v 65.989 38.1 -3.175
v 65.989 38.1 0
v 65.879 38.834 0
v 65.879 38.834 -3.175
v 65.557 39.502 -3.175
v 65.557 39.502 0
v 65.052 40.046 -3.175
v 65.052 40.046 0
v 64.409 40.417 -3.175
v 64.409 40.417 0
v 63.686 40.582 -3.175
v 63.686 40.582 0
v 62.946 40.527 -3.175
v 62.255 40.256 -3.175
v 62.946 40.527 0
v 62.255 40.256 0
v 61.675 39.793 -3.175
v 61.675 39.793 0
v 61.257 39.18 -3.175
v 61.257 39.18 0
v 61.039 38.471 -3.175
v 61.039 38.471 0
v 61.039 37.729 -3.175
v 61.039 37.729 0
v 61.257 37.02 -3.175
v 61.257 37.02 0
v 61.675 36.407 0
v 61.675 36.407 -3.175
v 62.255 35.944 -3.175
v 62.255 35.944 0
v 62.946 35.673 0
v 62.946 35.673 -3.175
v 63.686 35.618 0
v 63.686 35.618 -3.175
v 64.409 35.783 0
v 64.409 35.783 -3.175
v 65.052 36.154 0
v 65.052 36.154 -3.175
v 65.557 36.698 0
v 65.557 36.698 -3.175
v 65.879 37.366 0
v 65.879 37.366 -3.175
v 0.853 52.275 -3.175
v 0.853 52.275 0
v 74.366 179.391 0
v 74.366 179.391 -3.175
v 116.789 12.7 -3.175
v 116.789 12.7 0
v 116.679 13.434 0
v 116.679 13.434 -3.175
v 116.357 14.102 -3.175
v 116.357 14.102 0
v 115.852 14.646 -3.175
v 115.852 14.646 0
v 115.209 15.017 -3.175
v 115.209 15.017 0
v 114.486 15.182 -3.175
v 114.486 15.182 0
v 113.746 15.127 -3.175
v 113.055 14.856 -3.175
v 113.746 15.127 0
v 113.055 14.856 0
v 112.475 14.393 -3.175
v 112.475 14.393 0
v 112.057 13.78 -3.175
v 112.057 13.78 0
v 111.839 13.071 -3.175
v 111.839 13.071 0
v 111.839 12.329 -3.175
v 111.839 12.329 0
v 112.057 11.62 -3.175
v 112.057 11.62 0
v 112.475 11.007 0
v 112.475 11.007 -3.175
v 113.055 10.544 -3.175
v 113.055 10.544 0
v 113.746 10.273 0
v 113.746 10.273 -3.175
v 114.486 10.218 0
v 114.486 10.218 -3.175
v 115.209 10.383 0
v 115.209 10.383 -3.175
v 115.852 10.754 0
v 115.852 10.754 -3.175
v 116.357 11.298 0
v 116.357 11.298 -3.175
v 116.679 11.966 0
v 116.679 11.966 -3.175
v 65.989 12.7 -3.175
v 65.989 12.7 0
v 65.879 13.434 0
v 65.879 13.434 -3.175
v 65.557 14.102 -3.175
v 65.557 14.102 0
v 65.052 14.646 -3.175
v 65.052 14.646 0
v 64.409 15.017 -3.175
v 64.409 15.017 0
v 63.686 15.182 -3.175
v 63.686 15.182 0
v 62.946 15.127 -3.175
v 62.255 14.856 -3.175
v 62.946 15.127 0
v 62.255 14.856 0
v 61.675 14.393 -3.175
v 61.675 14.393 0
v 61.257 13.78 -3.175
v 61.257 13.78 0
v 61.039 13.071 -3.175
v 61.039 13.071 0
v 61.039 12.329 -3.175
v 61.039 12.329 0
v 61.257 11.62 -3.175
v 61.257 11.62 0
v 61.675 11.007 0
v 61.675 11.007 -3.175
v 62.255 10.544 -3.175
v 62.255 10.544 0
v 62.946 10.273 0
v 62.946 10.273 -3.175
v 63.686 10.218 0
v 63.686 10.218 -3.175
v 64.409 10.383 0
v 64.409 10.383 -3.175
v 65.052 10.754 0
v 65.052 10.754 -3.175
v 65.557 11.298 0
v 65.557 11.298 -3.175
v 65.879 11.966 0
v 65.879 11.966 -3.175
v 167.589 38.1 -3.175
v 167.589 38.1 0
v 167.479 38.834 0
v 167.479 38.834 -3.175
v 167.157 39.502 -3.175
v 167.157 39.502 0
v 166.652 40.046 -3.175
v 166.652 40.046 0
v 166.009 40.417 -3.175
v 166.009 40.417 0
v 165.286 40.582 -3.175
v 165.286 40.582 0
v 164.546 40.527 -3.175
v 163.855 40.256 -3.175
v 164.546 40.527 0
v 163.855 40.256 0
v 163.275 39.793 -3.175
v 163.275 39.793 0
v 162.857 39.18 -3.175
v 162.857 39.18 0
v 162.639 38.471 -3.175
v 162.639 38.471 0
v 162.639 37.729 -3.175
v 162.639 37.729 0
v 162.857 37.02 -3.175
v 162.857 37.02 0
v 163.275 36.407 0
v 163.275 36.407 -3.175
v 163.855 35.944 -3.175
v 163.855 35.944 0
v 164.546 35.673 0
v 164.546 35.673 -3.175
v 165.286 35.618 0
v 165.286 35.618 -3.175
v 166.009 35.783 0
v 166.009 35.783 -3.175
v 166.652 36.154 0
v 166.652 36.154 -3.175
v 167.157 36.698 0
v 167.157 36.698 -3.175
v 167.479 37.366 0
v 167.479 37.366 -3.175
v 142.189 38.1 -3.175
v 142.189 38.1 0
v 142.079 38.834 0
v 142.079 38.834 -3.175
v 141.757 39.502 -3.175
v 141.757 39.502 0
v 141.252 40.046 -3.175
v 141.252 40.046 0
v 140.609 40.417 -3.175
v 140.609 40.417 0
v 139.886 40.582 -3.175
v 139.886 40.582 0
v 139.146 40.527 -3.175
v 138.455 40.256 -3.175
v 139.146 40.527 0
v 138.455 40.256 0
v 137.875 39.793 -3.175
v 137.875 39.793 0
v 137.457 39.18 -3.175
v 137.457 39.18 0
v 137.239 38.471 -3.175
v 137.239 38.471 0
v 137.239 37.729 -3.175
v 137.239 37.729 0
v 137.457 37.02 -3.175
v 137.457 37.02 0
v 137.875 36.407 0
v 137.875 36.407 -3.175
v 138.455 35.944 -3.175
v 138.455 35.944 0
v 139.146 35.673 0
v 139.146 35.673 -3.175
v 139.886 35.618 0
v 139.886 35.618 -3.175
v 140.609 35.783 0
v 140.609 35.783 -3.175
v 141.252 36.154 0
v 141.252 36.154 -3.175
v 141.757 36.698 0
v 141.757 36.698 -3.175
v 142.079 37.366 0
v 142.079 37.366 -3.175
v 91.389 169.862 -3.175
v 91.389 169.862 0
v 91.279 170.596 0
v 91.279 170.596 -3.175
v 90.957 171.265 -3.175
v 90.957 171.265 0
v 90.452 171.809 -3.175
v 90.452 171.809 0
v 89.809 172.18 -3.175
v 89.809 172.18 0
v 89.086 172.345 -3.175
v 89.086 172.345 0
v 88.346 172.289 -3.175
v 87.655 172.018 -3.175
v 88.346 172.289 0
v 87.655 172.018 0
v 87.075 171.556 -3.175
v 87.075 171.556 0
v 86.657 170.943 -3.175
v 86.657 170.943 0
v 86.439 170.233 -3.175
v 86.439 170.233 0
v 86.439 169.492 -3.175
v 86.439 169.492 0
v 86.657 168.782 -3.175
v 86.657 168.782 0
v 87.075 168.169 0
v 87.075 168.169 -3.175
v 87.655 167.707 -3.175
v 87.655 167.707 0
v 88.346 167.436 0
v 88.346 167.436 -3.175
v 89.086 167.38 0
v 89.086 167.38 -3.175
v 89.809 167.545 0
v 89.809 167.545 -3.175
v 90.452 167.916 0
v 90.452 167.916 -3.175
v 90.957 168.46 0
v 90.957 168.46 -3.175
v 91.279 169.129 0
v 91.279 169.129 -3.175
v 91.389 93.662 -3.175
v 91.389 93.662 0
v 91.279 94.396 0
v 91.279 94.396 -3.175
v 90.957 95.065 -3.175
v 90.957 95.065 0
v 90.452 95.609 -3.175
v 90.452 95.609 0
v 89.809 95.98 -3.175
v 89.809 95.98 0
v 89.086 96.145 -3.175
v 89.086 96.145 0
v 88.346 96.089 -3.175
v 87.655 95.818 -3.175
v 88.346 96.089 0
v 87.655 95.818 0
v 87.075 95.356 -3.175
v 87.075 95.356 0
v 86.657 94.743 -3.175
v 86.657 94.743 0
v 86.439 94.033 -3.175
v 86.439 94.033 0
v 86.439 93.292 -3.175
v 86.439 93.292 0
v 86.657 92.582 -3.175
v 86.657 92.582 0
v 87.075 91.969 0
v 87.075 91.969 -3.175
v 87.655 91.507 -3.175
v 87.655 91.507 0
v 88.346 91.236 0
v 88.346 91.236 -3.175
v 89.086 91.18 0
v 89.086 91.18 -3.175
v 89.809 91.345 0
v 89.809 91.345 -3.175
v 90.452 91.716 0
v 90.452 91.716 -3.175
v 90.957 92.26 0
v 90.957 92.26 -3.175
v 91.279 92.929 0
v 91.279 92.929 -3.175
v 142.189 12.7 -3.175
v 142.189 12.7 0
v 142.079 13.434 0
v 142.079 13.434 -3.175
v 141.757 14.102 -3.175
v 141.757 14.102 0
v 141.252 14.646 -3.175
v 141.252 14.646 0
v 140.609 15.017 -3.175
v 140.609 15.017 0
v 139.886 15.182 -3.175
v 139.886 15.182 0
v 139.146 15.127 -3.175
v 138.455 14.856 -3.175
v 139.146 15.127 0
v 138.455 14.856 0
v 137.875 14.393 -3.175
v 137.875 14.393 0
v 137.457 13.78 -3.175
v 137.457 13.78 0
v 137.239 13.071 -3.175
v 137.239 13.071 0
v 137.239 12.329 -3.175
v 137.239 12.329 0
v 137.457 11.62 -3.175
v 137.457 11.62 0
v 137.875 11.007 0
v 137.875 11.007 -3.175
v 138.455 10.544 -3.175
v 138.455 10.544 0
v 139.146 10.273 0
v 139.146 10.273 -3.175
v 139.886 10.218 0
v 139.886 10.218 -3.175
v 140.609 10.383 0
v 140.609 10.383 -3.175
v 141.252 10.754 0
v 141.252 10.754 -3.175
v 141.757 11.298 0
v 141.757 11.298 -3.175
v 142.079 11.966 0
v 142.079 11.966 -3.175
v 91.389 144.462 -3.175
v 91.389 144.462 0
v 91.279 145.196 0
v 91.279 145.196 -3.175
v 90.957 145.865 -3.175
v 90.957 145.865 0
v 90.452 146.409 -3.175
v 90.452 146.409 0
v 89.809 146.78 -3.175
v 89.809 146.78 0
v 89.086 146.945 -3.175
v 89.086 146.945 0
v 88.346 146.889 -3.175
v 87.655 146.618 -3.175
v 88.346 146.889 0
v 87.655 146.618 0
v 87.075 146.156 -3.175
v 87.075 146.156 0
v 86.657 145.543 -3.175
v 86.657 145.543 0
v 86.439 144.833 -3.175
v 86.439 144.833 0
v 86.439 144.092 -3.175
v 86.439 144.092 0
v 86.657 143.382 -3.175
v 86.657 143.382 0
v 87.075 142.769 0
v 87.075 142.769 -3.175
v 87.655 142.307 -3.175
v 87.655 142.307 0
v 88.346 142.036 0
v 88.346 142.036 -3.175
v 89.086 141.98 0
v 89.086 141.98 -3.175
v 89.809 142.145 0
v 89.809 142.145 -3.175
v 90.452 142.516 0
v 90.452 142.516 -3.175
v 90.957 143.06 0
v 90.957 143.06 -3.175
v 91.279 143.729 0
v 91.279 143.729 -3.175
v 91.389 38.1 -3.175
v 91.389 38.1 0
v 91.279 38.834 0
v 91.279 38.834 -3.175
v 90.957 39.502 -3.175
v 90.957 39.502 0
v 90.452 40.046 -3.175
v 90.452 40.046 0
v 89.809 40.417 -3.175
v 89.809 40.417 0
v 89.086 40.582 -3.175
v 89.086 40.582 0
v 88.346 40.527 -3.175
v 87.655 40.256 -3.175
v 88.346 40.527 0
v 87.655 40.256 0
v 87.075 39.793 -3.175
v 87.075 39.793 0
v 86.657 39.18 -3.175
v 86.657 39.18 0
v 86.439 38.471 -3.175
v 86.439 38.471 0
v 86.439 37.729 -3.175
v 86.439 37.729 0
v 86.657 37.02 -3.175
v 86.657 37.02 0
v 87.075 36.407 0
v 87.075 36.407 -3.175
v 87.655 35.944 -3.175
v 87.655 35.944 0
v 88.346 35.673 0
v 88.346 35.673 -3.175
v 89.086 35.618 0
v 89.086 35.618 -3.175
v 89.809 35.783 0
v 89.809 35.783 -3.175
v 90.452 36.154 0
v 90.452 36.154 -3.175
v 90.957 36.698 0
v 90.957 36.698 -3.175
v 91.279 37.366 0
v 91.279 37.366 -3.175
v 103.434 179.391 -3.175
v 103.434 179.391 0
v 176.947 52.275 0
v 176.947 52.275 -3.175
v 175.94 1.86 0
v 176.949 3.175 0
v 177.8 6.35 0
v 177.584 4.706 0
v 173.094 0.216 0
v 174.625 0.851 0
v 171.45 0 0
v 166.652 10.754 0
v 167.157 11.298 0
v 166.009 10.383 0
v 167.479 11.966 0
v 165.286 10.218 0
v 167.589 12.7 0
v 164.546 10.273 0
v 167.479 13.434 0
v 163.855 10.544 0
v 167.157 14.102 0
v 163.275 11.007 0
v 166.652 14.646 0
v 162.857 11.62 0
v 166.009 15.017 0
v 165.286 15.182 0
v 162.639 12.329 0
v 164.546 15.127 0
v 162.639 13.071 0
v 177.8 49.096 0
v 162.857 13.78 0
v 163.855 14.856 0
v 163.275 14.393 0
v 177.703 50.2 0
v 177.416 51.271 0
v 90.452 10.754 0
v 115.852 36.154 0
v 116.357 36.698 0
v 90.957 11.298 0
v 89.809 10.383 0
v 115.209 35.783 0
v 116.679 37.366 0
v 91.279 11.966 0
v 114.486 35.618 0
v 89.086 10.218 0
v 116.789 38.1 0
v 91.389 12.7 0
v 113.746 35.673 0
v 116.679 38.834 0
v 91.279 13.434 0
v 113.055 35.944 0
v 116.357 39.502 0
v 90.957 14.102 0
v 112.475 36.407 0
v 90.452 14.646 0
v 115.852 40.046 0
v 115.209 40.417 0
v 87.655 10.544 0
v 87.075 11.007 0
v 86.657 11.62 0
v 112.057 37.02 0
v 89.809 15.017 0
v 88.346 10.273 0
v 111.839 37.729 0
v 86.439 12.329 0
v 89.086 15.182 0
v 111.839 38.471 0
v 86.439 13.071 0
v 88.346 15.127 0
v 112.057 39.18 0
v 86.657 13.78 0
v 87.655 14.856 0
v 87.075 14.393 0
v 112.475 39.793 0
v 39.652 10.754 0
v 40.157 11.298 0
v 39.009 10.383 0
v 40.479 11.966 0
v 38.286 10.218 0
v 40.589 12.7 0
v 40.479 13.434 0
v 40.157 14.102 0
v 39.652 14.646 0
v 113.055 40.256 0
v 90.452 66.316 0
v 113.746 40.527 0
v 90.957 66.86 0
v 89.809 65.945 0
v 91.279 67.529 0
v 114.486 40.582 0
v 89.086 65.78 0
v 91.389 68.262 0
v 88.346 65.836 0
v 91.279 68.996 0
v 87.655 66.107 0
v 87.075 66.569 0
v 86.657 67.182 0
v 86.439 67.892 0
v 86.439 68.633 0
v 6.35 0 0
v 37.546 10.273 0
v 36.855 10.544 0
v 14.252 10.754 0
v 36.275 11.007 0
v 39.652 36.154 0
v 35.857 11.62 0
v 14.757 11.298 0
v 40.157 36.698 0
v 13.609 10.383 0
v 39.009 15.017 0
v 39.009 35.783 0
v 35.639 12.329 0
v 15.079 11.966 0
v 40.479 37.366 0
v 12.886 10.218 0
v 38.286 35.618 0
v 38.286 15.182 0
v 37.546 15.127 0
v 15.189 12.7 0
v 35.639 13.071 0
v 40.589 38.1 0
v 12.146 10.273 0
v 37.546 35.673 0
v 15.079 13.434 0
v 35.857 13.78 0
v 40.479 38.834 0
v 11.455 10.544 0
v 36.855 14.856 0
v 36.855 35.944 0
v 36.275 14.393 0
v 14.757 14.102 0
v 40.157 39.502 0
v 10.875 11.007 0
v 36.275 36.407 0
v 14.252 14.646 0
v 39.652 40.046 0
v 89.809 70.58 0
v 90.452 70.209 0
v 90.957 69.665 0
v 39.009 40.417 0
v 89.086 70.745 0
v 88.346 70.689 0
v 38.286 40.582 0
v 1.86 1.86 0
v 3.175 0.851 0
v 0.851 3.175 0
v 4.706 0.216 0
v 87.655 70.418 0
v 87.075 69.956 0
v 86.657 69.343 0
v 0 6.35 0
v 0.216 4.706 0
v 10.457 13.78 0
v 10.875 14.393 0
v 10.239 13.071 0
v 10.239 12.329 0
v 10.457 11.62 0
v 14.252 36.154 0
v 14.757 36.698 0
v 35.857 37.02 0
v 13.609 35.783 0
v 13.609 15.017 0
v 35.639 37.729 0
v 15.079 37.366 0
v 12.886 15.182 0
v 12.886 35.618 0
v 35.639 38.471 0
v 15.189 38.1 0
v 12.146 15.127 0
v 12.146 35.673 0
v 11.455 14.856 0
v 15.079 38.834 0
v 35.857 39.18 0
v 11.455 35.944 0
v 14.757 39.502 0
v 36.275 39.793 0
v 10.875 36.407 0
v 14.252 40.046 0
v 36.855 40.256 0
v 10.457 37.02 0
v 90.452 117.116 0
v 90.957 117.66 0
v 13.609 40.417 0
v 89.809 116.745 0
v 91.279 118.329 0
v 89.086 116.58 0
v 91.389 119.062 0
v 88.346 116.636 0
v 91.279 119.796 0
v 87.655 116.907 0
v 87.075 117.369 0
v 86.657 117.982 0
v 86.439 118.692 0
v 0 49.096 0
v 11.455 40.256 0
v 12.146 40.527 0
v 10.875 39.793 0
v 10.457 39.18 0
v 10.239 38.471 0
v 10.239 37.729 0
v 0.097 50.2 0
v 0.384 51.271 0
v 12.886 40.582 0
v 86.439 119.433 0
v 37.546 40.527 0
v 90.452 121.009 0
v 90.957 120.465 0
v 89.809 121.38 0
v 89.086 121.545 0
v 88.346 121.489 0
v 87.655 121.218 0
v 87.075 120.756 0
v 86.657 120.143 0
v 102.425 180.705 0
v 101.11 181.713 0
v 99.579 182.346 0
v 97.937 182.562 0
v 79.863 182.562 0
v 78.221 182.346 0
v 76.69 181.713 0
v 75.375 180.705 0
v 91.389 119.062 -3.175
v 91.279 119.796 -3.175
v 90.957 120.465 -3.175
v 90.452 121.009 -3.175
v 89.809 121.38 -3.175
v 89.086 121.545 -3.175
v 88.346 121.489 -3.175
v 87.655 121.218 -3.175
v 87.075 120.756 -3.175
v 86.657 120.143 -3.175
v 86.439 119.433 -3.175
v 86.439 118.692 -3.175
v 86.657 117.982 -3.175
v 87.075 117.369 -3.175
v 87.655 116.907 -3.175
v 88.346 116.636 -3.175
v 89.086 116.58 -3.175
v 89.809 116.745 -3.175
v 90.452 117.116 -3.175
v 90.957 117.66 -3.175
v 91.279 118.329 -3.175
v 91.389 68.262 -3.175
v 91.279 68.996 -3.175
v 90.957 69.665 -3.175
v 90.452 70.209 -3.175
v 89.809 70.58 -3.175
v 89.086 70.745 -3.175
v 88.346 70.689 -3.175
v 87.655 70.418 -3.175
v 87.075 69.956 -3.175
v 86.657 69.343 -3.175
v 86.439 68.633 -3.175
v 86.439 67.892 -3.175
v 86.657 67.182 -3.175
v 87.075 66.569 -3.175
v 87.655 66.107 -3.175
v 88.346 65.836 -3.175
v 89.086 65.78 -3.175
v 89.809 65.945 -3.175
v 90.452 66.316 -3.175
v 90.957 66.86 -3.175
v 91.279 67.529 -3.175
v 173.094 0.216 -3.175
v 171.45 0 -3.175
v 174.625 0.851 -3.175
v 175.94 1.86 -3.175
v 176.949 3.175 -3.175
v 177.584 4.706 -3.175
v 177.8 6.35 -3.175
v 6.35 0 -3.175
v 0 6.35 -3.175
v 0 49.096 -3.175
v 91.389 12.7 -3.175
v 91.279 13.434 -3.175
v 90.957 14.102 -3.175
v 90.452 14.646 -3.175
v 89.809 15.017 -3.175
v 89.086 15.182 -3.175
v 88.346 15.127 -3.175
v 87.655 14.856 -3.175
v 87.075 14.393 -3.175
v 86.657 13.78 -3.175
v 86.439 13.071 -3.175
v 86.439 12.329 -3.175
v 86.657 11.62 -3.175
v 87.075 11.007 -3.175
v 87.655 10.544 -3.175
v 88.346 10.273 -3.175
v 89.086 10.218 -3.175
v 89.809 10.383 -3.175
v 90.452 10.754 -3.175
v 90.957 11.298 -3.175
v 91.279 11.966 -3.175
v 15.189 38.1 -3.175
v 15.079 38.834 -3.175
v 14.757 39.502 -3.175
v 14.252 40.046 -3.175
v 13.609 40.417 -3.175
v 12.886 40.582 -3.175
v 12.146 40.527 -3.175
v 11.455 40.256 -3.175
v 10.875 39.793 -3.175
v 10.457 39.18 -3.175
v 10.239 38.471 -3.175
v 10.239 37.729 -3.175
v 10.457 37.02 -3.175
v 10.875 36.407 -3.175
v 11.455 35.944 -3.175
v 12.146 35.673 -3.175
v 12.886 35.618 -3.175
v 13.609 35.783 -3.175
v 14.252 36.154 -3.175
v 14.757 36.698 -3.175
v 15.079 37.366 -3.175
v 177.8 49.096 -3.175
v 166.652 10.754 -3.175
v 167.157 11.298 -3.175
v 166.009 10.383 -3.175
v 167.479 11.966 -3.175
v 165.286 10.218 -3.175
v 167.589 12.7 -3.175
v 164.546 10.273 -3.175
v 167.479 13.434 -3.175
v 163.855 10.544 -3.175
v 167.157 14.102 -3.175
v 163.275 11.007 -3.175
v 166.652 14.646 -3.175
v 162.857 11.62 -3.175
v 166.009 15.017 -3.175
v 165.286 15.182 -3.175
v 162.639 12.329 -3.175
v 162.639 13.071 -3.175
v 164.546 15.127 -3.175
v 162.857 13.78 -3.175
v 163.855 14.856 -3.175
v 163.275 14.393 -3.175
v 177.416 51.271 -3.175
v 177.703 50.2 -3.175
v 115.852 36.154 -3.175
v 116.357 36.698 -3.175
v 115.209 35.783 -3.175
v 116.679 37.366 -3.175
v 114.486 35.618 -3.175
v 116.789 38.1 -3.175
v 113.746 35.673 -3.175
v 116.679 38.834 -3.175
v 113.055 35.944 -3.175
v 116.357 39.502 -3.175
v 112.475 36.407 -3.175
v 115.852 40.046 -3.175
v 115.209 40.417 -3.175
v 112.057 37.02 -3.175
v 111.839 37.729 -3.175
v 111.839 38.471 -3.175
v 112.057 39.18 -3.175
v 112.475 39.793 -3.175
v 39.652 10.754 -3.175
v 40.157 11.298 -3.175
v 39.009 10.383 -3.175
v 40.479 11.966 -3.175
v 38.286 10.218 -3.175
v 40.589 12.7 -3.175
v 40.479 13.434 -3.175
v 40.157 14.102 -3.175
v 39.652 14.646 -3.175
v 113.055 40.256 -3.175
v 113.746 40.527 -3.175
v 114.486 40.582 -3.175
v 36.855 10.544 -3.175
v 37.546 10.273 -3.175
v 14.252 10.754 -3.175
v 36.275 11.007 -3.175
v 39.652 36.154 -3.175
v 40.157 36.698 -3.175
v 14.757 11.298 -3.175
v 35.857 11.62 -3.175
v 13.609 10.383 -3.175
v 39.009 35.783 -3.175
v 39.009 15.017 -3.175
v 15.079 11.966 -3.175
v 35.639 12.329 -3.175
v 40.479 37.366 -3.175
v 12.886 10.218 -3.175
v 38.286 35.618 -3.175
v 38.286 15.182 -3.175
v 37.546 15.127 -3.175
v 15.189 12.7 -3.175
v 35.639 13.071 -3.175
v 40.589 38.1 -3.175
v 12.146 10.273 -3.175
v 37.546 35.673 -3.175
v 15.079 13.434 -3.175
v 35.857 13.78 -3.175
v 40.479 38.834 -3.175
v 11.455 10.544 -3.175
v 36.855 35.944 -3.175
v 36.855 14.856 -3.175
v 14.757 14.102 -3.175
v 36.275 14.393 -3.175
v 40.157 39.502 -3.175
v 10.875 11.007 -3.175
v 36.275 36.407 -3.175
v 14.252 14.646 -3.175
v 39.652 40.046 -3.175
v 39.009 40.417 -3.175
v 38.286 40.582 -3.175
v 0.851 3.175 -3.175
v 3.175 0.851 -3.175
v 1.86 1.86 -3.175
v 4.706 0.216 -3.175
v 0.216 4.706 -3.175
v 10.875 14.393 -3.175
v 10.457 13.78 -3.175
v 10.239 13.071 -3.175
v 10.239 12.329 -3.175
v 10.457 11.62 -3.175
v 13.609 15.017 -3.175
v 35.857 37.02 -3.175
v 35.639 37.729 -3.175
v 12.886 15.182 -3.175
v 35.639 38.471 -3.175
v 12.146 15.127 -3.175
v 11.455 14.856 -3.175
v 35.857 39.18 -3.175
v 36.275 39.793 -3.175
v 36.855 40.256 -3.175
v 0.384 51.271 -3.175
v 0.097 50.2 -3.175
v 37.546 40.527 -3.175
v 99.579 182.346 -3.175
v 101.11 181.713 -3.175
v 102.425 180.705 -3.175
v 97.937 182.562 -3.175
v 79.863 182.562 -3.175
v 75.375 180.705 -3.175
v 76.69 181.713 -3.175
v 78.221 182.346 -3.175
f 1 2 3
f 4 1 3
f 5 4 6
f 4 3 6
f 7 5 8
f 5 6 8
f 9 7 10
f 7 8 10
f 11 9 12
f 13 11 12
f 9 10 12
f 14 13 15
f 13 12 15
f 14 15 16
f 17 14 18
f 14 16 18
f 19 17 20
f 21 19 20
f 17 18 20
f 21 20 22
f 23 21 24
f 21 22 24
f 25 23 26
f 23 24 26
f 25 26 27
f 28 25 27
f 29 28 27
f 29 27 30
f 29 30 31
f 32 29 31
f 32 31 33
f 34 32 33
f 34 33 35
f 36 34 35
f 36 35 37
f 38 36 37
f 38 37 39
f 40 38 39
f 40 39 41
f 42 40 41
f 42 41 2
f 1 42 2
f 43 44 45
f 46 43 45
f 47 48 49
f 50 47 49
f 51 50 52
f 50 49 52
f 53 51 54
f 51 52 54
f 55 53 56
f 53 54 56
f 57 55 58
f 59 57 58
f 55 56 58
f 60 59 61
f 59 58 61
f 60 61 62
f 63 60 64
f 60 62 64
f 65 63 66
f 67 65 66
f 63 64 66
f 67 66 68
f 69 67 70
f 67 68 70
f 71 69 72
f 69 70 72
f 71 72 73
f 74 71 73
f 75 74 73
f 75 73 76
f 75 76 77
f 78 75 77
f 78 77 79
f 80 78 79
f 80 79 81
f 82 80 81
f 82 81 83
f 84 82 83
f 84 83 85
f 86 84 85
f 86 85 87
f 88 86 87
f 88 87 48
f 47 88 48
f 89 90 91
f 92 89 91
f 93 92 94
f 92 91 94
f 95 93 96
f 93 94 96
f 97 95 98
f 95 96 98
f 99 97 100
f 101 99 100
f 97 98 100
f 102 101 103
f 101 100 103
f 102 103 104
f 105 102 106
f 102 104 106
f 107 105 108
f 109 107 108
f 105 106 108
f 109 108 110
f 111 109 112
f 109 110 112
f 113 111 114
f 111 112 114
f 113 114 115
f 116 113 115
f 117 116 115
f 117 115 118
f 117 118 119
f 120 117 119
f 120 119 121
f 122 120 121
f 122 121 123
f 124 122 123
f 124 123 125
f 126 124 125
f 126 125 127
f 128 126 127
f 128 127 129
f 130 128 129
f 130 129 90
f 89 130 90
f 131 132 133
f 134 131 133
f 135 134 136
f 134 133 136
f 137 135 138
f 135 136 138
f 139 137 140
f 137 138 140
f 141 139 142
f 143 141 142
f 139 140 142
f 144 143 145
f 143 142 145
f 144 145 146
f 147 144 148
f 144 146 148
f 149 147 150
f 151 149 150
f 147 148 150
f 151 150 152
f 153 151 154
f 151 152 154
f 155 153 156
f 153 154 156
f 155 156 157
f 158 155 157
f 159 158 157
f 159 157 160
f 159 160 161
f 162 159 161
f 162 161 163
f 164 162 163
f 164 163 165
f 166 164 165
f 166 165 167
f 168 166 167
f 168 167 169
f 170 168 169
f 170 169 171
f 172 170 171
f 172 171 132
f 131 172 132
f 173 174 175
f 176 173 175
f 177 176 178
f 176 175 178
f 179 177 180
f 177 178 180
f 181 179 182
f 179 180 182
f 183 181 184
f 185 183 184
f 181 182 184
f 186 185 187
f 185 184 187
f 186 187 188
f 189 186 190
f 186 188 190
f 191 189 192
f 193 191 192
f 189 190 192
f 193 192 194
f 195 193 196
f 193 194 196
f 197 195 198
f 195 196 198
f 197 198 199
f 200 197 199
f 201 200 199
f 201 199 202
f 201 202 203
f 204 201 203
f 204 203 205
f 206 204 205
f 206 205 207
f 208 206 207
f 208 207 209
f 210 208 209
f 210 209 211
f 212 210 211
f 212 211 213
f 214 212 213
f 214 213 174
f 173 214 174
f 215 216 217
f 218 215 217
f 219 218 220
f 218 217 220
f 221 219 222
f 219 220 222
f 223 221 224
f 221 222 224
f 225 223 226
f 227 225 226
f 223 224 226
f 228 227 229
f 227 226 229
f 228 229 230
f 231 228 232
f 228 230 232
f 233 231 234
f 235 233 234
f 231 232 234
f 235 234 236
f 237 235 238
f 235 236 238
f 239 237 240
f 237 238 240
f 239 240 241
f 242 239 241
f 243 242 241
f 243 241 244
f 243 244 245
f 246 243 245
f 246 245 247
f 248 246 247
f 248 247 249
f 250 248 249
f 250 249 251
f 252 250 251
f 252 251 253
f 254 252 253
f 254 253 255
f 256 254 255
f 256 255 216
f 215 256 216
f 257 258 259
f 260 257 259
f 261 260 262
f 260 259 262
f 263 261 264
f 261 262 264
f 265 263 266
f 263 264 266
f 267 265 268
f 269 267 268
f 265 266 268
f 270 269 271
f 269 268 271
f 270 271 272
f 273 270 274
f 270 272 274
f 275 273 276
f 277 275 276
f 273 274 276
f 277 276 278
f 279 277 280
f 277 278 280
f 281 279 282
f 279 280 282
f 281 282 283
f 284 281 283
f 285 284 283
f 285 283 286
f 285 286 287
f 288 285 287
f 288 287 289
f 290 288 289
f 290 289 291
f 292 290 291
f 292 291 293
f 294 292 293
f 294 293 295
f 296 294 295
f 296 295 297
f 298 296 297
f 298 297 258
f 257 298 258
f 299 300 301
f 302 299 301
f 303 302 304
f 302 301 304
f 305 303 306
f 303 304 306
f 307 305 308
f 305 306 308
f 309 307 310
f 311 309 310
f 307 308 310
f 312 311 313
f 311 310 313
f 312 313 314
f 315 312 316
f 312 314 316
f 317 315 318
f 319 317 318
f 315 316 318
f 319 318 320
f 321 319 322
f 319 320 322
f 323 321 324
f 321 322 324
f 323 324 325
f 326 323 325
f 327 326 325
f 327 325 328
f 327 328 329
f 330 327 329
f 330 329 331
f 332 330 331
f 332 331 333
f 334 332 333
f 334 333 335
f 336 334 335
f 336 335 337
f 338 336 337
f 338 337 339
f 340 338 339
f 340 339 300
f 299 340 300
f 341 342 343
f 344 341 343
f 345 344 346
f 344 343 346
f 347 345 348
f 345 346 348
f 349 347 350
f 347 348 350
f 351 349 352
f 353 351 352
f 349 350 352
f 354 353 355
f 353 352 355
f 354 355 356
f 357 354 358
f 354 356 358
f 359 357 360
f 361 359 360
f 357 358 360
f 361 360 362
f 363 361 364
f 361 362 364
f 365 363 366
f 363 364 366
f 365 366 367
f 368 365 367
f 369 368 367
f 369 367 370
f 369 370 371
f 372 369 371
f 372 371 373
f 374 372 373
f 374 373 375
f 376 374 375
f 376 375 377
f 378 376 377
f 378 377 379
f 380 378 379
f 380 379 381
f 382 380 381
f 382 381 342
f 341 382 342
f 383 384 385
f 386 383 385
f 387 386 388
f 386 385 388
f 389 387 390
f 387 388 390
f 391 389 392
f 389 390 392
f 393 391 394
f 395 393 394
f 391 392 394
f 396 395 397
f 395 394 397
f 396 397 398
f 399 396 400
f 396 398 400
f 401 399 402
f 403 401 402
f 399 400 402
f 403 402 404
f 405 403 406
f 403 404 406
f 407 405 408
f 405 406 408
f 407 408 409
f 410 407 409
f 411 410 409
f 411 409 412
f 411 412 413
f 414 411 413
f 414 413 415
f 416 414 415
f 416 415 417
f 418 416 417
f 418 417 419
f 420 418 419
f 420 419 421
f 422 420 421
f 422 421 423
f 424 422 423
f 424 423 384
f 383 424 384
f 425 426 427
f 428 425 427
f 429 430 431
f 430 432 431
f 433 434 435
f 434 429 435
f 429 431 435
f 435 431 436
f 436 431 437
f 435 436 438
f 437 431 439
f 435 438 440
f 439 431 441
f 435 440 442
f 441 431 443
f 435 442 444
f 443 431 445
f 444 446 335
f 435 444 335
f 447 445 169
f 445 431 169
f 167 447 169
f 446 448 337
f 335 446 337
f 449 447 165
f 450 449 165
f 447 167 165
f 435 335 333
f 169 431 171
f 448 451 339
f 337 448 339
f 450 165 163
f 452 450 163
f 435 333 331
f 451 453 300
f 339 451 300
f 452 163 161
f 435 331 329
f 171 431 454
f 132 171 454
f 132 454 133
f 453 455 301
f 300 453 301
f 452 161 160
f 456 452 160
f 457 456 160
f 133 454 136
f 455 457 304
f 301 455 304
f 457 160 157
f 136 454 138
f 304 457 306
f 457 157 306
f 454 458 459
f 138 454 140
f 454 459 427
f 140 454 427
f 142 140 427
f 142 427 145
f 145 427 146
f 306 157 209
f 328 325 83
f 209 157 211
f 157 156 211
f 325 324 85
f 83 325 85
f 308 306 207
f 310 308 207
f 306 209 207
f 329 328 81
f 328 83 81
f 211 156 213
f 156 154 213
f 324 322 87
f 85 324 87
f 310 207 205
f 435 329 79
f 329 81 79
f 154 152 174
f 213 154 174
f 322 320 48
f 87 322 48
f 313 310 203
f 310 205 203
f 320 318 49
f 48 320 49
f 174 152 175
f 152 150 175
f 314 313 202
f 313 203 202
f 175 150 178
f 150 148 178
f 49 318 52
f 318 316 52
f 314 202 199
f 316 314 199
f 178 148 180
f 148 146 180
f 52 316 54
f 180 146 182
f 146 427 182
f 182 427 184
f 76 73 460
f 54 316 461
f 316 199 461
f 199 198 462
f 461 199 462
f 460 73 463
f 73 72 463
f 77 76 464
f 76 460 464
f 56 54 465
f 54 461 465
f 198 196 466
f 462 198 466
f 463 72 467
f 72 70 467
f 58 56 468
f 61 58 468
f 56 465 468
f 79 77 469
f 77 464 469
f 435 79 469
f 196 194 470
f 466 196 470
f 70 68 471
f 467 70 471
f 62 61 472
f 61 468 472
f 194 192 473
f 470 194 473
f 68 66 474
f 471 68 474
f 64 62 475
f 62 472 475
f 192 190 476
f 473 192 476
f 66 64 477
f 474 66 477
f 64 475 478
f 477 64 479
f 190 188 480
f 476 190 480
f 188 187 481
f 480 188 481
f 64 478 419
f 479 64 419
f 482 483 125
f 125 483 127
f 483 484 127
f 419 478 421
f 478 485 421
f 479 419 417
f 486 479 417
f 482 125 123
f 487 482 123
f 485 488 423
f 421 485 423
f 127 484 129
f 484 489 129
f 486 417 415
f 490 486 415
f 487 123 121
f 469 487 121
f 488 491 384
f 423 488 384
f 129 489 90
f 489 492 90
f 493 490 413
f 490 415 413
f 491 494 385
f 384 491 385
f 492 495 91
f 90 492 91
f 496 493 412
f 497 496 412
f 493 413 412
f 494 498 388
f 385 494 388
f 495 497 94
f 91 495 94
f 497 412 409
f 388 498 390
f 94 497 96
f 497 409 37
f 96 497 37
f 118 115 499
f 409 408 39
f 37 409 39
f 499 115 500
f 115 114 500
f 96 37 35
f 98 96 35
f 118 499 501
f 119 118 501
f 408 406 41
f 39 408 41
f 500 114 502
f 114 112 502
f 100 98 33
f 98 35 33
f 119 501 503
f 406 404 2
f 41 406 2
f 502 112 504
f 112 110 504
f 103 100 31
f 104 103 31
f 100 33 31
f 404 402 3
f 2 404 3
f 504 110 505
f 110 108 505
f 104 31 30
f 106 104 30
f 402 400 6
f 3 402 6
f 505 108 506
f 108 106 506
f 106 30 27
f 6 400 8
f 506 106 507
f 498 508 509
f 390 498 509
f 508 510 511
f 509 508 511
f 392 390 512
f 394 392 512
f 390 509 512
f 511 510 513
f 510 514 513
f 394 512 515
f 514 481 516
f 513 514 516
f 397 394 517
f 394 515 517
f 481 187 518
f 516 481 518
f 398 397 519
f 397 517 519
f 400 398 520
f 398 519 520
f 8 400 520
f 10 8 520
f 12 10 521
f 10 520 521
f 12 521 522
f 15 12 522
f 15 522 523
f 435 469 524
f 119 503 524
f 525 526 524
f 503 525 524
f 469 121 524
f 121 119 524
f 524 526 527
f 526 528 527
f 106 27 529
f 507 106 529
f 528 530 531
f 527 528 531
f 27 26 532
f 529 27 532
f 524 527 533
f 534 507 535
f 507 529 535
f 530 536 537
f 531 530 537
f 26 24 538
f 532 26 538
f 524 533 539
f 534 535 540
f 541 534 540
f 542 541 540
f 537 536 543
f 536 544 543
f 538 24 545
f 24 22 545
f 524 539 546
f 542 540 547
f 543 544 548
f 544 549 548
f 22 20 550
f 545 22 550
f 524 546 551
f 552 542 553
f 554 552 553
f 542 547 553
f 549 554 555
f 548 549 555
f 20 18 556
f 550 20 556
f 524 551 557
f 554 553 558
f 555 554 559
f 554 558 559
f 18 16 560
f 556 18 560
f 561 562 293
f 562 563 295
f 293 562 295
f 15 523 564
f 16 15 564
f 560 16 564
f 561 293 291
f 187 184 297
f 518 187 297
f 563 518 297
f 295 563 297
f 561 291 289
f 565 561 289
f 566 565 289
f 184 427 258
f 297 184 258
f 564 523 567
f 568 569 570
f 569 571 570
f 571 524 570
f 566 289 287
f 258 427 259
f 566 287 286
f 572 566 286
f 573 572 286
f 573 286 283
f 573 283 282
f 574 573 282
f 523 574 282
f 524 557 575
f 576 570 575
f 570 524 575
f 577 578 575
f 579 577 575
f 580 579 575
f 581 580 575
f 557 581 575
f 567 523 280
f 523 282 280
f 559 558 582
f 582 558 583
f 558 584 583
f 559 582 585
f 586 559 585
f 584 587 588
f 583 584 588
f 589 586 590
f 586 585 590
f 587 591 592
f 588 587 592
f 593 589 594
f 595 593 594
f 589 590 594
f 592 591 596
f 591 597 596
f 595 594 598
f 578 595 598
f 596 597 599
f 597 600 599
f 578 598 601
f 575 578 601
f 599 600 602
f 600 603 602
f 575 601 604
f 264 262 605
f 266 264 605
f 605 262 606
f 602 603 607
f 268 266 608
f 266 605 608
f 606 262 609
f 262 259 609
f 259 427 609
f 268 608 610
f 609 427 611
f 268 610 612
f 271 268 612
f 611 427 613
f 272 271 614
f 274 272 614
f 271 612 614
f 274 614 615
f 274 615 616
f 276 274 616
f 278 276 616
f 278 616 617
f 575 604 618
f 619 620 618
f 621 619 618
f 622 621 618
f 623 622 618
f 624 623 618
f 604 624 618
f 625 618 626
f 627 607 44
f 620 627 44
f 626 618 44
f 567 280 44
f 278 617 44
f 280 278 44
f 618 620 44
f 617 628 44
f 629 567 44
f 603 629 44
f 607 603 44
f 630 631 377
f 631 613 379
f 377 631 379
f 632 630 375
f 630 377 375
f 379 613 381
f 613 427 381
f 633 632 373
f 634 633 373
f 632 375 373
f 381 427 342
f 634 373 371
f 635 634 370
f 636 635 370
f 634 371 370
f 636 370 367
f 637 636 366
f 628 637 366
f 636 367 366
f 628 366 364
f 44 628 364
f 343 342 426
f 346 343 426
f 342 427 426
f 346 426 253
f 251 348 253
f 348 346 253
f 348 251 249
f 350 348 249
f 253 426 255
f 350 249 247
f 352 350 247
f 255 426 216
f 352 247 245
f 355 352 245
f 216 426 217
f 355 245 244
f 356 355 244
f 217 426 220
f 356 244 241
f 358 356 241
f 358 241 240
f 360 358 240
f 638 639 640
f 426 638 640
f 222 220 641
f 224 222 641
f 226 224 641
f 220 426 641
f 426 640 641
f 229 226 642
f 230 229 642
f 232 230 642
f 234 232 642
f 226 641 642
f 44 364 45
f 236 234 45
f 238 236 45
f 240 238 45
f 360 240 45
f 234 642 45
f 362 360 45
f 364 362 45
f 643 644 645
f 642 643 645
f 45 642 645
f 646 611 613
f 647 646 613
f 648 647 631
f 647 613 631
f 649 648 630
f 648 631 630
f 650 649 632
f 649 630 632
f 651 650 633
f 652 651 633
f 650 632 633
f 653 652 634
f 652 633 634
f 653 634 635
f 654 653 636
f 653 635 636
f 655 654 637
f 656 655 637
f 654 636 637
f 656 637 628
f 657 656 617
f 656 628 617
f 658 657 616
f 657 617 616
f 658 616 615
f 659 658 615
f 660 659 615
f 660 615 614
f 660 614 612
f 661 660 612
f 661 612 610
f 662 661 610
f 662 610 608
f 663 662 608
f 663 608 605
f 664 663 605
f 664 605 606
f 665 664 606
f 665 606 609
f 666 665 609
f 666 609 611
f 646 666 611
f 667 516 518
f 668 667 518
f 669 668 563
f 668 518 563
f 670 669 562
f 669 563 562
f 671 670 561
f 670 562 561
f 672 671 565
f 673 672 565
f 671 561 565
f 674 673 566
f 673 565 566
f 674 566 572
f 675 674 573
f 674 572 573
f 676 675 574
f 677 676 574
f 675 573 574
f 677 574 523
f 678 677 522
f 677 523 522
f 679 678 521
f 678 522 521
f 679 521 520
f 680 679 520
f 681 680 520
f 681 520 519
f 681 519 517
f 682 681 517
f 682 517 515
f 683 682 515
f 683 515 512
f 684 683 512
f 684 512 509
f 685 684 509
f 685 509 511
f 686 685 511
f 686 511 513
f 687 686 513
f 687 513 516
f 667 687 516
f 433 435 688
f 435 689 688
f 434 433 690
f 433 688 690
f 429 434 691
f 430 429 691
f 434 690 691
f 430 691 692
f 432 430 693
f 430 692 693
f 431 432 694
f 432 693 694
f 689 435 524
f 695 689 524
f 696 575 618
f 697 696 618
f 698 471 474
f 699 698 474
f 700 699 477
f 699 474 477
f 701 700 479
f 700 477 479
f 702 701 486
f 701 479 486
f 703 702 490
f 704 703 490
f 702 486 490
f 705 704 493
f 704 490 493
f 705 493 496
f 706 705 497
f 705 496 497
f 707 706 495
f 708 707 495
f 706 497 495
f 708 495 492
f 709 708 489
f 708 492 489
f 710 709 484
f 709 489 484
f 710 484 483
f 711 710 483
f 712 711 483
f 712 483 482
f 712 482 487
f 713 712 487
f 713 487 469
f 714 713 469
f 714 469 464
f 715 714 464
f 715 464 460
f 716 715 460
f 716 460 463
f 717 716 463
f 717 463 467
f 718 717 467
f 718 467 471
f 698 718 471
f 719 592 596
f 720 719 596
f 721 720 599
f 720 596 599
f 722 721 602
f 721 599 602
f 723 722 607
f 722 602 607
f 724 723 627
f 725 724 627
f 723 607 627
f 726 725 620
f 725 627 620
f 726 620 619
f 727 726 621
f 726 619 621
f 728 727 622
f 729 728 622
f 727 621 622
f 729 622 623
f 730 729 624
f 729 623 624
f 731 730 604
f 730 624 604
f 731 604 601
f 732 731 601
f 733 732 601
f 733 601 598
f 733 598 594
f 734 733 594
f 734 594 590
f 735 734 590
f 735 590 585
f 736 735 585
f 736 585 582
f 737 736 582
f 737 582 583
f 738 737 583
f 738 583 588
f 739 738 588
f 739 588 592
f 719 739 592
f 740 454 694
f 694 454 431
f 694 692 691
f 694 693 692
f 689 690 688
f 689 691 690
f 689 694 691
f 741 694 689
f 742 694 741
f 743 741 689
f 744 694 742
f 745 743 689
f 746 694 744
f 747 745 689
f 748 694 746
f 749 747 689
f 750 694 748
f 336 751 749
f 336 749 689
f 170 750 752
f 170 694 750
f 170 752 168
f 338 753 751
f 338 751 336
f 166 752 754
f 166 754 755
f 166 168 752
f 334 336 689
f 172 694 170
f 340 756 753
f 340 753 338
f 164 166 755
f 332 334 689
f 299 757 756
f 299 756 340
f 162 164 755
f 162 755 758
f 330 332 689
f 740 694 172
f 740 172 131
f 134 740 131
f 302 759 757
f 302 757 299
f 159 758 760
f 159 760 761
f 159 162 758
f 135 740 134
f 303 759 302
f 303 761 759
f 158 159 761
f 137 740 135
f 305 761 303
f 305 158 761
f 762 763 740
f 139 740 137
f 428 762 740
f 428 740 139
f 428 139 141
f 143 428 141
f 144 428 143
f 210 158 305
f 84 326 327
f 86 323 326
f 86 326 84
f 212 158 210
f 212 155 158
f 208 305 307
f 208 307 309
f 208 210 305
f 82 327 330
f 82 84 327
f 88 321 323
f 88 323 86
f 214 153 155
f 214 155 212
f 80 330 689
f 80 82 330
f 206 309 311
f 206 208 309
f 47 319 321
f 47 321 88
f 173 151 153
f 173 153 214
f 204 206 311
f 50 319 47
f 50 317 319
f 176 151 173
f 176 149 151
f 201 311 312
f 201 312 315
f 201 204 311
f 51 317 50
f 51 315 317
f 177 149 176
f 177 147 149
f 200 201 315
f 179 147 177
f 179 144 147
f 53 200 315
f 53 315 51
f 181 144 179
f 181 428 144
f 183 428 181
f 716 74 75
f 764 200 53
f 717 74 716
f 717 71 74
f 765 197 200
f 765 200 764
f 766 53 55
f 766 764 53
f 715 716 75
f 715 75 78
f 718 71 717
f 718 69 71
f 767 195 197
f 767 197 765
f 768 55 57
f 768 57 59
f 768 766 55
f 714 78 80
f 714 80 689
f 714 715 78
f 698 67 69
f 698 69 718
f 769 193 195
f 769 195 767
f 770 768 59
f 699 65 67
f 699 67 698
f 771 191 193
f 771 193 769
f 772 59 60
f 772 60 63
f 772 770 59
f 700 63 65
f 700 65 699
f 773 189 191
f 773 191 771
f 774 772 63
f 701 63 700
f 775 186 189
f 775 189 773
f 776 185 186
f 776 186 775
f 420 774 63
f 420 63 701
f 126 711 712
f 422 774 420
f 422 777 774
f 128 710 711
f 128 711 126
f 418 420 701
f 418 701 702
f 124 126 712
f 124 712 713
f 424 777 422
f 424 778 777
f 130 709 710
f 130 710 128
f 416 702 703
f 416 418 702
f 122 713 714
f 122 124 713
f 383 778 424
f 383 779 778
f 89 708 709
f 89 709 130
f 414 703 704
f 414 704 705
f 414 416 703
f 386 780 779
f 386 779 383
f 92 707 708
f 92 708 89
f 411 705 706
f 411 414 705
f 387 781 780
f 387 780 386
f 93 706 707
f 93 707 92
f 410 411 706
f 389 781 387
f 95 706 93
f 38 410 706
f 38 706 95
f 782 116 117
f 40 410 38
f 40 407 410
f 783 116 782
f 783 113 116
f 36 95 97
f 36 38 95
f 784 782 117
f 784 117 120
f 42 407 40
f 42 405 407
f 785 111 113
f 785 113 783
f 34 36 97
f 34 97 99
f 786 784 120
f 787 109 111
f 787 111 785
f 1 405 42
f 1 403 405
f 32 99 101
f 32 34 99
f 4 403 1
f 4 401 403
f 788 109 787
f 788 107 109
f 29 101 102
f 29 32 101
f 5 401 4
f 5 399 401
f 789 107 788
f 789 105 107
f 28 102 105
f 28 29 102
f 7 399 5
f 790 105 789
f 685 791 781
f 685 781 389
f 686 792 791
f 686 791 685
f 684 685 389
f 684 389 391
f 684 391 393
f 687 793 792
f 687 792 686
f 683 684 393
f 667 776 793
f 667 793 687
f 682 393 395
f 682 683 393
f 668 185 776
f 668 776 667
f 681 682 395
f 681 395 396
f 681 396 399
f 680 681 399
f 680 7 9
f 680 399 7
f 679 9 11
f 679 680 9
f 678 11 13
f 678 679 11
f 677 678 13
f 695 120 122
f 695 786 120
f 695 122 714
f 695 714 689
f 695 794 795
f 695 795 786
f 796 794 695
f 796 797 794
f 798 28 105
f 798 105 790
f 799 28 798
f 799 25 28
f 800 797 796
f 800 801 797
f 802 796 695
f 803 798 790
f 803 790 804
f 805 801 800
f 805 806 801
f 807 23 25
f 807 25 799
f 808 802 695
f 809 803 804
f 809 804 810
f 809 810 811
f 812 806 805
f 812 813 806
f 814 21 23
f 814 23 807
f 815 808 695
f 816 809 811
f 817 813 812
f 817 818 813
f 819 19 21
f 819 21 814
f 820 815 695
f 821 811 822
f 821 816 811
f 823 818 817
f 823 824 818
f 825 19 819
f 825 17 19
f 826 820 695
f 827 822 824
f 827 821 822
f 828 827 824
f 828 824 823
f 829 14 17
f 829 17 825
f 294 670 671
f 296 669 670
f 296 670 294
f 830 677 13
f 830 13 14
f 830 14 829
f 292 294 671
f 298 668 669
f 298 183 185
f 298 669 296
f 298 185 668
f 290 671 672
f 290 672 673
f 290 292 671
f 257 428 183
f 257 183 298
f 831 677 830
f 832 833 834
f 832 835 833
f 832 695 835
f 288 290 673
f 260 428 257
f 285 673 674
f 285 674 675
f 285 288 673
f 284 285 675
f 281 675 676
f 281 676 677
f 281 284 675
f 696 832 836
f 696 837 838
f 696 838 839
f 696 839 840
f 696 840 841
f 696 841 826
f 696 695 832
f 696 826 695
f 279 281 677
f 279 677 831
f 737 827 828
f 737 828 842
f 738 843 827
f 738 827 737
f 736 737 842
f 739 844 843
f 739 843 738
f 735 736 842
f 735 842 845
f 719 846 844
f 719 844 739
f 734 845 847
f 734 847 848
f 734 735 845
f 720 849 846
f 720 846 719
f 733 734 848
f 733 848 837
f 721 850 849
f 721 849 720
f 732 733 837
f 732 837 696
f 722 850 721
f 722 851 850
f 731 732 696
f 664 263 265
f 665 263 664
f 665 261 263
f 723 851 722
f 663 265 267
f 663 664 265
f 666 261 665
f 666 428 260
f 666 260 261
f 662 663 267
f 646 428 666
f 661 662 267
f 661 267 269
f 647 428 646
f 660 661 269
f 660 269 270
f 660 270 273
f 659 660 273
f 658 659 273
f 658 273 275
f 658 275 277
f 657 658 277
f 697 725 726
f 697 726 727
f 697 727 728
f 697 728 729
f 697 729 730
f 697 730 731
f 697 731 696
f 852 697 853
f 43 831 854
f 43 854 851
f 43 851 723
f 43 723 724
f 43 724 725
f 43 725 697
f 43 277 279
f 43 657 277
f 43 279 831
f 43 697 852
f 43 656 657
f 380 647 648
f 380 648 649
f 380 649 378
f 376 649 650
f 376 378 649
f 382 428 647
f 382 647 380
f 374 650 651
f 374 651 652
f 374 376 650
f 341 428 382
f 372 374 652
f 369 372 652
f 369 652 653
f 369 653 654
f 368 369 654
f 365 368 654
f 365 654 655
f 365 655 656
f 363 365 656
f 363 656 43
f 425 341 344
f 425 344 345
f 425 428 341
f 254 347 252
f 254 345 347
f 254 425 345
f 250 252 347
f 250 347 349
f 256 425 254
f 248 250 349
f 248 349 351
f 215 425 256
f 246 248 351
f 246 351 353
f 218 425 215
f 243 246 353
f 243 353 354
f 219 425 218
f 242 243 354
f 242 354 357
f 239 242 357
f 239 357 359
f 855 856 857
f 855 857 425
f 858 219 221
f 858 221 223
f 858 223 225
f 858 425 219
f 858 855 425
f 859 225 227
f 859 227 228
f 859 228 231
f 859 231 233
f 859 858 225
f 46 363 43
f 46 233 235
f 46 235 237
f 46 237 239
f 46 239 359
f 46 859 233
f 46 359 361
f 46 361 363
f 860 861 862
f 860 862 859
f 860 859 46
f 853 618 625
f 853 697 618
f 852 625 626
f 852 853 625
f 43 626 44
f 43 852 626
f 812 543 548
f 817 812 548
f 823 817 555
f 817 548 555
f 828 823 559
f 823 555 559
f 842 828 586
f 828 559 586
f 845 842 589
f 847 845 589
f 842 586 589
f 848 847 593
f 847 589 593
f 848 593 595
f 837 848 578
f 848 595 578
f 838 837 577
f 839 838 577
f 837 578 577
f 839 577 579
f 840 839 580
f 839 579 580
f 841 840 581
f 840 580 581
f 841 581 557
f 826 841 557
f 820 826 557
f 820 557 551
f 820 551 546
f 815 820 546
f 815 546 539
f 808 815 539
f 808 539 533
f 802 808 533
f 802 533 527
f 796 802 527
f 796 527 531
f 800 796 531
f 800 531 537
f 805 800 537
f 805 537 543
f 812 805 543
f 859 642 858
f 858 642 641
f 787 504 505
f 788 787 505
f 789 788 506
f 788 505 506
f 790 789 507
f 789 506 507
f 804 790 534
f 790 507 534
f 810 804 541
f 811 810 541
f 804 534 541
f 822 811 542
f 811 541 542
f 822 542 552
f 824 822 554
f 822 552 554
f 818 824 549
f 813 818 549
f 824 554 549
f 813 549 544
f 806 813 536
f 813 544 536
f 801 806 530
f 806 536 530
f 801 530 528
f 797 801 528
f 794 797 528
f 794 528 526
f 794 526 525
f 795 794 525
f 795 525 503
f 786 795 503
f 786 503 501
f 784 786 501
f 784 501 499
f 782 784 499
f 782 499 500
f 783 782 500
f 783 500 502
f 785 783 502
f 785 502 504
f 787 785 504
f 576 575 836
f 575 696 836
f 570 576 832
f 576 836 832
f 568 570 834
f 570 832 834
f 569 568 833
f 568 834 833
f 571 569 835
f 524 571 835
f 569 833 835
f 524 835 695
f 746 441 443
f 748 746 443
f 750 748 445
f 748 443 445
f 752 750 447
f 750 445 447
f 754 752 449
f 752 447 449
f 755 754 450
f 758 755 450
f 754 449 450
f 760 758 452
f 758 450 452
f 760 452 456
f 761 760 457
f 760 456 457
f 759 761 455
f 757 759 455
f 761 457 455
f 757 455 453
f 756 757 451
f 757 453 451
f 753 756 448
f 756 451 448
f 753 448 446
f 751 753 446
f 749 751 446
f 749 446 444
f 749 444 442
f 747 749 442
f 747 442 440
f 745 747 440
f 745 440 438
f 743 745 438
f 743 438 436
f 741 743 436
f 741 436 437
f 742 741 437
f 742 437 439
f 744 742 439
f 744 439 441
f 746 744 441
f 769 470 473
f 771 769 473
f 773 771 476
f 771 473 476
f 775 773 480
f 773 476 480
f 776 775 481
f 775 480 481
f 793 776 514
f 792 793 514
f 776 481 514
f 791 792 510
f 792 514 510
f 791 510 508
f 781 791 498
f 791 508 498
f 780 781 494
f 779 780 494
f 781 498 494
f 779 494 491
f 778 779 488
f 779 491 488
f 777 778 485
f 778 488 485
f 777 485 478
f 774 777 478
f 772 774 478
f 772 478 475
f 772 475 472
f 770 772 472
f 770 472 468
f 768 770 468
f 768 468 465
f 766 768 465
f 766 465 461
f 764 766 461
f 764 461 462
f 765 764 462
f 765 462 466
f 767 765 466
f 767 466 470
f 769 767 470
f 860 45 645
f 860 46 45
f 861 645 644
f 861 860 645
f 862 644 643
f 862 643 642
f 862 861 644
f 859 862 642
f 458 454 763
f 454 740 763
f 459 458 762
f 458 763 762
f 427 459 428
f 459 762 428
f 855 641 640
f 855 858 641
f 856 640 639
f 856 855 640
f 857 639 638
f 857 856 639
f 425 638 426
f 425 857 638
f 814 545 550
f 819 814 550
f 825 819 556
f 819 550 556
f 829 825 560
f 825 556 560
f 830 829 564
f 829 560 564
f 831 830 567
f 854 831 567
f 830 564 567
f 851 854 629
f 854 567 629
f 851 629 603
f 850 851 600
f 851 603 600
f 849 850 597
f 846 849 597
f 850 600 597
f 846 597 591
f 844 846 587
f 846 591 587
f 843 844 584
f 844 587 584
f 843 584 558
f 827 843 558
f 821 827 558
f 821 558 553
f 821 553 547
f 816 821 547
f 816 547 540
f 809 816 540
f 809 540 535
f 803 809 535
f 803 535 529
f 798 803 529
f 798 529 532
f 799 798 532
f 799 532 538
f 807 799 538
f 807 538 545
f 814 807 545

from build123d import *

# Parameters (mm, degrees)
BOSS_EXTRUDE1_DEPTH = 3.175
SKETCH2_R           = 2.4892
CUT_EXTRUDE1_DEPTH  = 255.856797106
FILLET1_R           = 6.35


with BuildPart() as part:
    # Sketch1 → Boss-Extrude1 (new body)
    with BuildSketch(Plane.XY):
        Polygon((0, 0), (0, 50.8), (76.2, 182.5625), (101.6, 182.5625), (177.8, 50.8), (177.8, 0), align=None)
    extrude(amount=-BOSS_EXTRUDE1_DEPTH)

    # Sketch2 → Cut-Extrude1 (cut, through all)
    with BuildSketch(Plane.XY):
        with Locations((12.7, 12.7)):
            Circle(SKETCH2_R)
        with Locations((38.1, 12.7)):
            Circle(SKETCH2_R)
        with Locations((63.5, 12.7)):
            Circle(SKETCH2_R)
        with Locations((88.9, 12.7)):
            Circle(SKETCH2_R)
        with Locations((114.3, 12.7)):
            Circle(SKETCH2_R)
        with Locations((139.7, 12.7)):
            Circle(SKETCH2_R)
        with Locations((165.1, 12.7)):
            Circle(SKETCH2_R)
        with Locations((38.1, 38.1)):
            Circle(SKETCH2_R)
        with Locations((63.5, 38.1)):
            Circle(SKETCH2_R)
        with Locations((88.9, 38.1)):
            Circle(SKETCH2_R)
        with Locations((114.3, 38.1)):
            Circle(SKETCH2_R)
        with Locations((139.7, 38.1)):
            Circle(SKETCH2_R)
        with Locations((165.1, 38.1)):
            Circle(SKETCH2_R)
        with Locations((12.7, 38.1)):
            Circle(SKETCH2_R)
        with Locations((88.9, 169.8625)):
            Circle(SKETCH2_R)
        with Locations((88.9, 144.4625)):
            Circle(SKETCH2_R)
        with Locations((88.9, 119.0625)):
            Circle(SKETCH2_R)
        with Locations((88.9, 93.6625)):
            Circle(SKETCH2_R)
        with Locations((88.9, 68.2625)):
            Circle(SKETCH2_R)
    extrude(amount=-CUT_EXTRUDE1_DEPTH, mode=Mode.SUBTRACT)

    # Fillet1
    fillet1_edges = [part.edges().sort_by_distance(p)[0] for p in [
        (0, 0, -1.5875),
        (177.8, 0, -1.5875),
        (177.8, 50.8, -1.5875),
        (101.6, 182.5625, -1.5875),
        (76.2, 182.5625, -1.5875),
        (0, 50.8, -1.5875),
    ]]
    fillet(fillet1_edges, radius=FILLET1_R)


solid = part.part
